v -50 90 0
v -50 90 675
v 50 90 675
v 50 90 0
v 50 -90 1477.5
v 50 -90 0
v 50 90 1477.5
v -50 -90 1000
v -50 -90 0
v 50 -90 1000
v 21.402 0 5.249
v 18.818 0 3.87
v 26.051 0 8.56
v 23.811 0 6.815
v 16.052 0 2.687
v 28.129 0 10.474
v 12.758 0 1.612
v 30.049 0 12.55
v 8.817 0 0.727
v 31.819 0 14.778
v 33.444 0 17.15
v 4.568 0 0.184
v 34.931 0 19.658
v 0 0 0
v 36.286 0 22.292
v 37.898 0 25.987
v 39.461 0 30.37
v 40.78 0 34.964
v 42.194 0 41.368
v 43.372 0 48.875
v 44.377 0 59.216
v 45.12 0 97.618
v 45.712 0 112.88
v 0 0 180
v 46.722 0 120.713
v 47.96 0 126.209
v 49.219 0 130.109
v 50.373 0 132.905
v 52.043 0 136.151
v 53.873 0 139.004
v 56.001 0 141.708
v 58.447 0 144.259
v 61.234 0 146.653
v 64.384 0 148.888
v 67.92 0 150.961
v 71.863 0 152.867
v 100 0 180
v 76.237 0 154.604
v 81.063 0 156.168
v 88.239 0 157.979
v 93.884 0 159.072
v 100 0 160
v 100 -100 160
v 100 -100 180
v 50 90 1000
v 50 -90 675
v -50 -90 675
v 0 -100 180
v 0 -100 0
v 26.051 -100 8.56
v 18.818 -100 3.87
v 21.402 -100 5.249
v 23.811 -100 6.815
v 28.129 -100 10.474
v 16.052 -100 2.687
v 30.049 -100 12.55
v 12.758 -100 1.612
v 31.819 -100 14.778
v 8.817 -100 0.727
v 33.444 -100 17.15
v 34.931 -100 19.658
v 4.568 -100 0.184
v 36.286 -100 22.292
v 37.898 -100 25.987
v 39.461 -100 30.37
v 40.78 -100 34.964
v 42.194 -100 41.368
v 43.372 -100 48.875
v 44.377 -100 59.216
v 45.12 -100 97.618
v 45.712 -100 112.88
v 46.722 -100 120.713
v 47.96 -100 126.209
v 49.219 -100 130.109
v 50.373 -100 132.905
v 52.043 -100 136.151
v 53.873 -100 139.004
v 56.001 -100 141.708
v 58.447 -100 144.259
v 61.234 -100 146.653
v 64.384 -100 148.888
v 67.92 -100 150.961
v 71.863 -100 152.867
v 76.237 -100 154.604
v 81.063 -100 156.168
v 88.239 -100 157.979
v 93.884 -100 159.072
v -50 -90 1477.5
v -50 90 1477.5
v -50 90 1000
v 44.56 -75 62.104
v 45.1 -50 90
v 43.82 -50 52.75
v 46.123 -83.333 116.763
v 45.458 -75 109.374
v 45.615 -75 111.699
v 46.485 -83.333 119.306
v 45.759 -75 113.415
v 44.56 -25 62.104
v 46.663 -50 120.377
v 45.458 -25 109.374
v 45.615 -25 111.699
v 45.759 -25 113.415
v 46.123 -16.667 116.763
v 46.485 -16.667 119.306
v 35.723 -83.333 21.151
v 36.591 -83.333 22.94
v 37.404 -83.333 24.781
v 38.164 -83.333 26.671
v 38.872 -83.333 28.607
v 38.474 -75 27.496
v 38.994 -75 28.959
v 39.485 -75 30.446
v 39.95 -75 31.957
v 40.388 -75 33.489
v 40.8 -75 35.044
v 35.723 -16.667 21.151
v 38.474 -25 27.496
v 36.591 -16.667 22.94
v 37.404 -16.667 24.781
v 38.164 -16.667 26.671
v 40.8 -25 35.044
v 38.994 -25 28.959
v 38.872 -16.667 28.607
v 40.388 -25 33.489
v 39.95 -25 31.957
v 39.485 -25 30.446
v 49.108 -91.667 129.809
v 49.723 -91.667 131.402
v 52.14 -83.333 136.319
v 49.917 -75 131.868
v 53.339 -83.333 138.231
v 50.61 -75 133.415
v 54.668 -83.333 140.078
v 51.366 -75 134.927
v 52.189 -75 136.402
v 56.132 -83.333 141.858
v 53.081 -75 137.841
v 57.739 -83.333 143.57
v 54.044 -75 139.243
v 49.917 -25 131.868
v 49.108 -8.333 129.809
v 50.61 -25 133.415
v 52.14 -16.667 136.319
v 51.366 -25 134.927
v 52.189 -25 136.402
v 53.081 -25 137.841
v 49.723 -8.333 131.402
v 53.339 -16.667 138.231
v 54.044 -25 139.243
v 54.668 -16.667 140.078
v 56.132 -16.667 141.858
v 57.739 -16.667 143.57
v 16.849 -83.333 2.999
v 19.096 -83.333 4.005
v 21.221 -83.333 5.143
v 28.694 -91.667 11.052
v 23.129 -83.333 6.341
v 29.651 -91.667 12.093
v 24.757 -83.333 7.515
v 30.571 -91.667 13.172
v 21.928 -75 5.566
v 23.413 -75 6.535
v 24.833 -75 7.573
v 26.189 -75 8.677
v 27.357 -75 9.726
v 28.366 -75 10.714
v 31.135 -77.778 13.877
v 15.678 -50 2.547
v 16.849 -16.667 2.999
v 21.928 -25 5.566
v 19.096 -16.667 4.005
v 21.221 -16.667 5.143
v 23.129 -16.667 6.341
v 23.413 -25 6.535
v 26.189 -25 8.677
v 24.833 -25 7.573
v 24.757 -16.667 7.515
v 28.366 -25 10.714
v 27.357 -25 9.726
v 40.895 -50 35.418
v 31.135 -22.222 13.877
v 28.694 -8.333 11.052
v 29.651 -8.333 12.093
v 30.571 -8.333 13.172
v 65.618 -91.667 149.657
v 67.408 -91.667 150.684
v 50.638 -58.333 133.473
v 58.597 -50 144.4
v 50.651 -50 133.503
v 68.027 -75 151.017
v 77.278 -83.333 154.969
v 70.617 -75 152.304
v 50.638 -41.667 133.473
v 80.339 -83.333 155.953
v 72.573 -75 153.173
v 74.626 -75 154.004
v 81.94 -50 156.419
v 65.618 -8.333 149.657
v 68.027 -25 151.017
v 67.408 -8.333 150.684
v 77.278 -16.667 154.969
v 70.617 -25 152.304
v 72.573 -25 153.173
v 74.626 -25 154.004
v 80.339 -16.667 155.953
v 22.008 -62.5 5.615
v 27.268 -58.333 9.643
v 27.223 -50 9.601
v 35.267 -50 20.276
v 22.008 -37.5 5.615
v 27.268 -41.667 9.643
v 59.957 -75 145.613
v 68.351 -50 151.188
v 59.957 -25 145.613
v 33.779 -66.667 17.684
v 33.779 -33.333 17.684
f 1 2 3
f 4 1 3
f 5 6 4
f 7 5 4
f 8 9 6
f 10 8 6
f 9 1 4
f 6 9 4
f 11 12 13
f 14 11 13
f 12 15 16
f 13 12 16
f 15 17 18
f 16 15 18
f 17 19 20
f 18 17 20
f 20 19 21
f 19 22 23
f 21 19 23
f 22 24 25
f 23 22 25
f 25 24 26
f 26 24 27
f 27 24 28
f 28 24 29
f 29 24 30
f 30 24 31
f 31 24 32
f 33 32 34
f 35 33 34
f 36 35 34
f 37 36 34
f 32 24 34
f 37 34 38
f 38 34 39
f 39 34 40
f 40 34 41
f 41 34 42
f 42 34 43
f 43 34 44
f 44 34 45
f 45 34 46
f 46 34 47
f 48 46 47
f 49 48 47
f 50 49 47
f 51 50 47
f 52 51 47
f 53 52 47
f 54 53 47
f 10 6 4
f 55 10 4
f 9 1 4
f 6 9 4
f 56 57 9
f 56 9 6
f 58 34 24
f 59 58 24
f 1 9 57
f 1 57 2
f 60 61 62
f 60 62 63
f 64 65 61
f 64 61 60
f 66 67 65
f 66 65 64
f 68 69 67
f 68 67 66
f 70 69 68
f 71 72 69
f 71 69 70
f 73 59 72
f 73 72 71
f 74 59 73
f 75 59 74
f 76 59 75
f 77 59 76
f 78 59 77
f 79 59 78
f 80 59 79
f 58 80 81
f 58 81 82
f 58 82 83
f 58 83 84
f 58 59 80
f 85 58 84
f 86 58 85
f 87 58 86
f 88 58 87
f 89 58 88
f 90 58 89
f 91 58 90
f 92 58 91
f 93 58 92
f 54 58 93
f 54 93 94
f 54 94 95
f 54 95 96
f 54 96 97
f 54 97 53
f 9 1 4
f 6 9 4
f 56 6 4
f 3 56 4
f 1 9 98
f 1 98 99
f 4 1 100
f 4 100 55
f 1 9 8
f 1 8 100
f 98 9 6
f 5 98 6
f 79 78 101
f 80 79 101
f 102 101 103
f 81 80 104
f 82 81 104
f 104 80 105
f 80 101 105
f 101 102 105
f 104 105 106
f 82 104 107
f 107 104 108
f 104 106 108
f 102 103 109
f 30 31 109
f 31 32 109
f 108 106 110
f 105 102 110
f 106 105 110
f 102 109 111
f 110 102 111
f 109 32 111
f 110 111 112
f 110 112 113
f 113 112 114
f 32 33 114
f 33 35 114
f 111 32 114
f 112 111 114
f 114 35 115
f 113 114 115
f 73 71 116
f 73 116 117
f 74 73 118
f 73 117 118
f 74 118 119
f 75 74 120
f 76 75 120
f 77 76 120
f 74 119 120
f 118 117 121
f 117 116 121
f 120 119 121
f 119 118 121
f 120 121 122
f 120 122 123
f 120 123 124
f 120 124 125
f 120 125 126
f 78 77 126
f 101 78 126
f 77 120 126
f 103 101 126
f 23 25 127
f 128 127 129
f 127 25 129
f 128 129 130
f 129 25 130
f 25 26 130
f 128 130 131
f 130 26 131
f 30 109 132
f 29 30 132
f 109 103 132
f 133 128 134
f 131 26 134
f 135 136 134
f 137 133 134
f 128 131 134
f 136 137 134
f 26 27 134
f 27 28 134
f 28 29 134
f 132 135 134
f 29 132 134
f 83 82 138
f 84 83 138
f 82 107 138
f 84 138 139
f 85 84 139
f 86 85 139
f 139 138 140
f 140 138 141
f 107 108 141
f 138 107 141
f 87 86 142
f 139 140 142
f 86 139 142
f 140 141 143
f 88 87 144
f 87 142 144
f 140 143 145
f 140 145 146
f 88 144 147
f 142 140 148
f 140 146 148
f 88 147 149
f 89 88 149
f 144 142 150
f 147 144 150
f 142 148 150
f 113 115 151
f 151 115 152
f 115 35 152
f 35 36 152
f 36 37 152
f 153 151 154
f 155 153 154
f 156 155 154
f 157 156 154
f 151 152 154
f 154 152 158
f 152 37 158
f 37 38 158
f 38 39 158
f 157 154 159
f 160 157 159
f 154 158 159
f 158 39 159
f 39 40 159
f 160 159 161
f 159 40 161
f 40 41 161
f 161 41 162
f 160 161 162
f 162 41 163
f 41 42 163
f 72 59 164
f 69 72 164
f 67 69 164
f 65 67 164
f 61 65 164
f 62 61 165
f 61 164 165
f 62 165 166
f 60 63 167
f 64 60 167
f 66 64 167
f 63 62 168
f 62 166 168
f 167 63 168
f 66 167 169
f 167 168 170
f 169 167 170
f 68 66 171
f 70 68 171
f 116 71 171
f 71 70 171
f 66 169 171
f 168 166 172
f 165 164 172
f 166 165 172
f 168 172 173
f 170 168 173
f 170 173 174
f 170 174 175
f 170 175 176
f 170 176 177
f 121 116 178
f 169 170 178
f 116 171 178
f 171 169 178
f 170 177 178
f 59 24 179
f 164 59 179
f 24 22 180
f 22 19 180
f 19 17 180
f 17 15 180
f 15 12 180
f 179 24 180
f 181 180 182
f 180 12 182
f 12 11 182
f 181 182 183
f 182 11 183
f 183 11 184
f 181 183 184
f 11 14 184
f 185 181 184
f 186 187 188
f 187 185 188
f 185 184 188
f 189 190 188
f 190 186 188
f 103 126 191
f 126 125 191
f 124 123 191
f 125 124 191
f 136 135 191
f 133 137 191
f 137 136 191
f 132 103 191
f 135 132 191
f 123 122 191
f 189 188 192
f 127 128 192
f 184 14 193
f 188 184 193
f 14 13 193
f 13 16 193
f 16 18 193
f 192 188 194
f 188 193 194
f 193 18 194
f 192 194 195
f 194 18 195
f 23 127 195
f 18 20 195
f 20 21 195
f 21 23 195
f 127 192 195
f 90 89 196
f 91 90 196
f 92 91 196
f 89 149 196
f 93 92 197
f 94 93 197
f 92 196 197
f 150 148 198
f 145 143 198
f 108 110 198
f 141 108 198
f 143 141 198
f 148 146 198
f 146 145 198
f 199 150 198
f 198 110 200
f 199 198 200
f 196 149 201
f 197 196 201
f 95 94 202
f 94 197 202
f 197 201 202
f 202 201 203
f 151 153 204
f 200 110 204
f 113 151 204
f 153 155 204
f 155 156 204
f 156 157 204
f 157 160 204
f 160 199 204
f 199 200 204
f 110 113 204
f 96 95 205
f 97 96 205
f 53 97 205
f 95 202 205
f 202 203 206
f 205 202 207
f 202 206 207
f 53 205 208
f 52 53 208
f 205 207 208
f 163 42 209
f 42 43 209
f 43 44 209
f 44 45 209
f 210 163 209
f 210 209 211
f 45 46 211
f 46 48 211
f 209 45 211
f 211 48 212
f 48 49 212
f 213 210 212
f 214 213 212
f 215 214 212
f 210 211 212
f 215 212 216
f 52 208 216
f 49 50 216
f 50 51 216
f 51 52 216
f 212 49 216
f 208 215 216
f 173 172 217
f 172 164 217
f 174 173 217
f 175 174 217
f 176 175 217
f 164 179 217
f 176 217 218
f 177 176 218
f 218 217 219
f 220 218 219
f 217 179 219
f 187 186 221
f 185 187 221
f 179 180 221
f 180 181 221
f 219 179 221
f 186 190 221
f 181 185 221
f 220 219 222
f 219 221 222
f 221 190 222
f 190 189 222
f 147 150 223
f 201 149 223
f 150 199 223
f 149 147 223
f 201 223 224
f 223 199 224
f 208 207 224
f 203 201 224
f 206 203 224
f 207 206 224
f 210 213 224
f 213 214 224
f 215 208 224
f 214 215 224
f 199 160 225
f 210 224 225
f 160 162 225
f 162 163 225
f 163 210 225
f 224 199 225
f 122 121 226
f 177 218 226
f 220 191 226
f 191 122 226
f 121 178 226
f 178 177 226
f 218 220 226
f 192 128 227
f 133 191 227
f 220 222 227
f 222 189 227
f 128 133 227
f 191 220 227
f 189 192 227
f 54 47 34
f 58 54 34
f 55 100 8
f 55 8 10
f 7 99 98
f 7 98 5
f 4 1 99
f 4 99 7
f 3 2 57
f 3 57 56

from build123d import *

# Parameters (mm, degrees)
F0_W     = 100
F0_H     = 180
F1_DEPTH = 1000
F2_DEPTH = 675
F3_DEPTH = 1477.5
F5_DEPTH = 100


with BuildPart() as f1:
    # F0 (on Top) → F1 (new body)
    with BuildSketch(Plane.XY):
        Rectangle(F0_W, F0_H)
    extrude(amount=F1_DEPTH)


with BuildPart() as f2:
    # F0 (on Top) → F2 (new body)
    with BuildSketch(Plane.XY):
        Rectangle(F0_W, F0_H)
    extrude(amount=F2_DEPTH)


with BuildPart() as f3:
    # F0 (on Top) → F3 (new body)
    with BuildSketch(Plane.XY):
        Rectangle(F0_W, F0_H)
    extrude(amount=F3_DEPTH)


with BuildPart() as f5:
    # F4 (on Front) → F5 (new body)
    with BuildSketch(Plane.XZ):
        with BuildLine():
            Line((0, 180), (0, 0))
            add(Edge.make_bspline(
                [(0, 0), (45.1004018503, 0), (45.1004018503, 98.9498016724), (45.1004018503, 152.7065502693), (100, 160)],
                knots=[0, 0, 0, 0, 0.5154495578, 1, 1, 1, 1], degree=3))
            Line((100, 160), (100, 180))
            Line((100, 180), (0, 180))
        make_face()
    extrude(amount=F5_DEPTH)


solid = Compound([f1.part, f2.part, f3.part, f5.part])
